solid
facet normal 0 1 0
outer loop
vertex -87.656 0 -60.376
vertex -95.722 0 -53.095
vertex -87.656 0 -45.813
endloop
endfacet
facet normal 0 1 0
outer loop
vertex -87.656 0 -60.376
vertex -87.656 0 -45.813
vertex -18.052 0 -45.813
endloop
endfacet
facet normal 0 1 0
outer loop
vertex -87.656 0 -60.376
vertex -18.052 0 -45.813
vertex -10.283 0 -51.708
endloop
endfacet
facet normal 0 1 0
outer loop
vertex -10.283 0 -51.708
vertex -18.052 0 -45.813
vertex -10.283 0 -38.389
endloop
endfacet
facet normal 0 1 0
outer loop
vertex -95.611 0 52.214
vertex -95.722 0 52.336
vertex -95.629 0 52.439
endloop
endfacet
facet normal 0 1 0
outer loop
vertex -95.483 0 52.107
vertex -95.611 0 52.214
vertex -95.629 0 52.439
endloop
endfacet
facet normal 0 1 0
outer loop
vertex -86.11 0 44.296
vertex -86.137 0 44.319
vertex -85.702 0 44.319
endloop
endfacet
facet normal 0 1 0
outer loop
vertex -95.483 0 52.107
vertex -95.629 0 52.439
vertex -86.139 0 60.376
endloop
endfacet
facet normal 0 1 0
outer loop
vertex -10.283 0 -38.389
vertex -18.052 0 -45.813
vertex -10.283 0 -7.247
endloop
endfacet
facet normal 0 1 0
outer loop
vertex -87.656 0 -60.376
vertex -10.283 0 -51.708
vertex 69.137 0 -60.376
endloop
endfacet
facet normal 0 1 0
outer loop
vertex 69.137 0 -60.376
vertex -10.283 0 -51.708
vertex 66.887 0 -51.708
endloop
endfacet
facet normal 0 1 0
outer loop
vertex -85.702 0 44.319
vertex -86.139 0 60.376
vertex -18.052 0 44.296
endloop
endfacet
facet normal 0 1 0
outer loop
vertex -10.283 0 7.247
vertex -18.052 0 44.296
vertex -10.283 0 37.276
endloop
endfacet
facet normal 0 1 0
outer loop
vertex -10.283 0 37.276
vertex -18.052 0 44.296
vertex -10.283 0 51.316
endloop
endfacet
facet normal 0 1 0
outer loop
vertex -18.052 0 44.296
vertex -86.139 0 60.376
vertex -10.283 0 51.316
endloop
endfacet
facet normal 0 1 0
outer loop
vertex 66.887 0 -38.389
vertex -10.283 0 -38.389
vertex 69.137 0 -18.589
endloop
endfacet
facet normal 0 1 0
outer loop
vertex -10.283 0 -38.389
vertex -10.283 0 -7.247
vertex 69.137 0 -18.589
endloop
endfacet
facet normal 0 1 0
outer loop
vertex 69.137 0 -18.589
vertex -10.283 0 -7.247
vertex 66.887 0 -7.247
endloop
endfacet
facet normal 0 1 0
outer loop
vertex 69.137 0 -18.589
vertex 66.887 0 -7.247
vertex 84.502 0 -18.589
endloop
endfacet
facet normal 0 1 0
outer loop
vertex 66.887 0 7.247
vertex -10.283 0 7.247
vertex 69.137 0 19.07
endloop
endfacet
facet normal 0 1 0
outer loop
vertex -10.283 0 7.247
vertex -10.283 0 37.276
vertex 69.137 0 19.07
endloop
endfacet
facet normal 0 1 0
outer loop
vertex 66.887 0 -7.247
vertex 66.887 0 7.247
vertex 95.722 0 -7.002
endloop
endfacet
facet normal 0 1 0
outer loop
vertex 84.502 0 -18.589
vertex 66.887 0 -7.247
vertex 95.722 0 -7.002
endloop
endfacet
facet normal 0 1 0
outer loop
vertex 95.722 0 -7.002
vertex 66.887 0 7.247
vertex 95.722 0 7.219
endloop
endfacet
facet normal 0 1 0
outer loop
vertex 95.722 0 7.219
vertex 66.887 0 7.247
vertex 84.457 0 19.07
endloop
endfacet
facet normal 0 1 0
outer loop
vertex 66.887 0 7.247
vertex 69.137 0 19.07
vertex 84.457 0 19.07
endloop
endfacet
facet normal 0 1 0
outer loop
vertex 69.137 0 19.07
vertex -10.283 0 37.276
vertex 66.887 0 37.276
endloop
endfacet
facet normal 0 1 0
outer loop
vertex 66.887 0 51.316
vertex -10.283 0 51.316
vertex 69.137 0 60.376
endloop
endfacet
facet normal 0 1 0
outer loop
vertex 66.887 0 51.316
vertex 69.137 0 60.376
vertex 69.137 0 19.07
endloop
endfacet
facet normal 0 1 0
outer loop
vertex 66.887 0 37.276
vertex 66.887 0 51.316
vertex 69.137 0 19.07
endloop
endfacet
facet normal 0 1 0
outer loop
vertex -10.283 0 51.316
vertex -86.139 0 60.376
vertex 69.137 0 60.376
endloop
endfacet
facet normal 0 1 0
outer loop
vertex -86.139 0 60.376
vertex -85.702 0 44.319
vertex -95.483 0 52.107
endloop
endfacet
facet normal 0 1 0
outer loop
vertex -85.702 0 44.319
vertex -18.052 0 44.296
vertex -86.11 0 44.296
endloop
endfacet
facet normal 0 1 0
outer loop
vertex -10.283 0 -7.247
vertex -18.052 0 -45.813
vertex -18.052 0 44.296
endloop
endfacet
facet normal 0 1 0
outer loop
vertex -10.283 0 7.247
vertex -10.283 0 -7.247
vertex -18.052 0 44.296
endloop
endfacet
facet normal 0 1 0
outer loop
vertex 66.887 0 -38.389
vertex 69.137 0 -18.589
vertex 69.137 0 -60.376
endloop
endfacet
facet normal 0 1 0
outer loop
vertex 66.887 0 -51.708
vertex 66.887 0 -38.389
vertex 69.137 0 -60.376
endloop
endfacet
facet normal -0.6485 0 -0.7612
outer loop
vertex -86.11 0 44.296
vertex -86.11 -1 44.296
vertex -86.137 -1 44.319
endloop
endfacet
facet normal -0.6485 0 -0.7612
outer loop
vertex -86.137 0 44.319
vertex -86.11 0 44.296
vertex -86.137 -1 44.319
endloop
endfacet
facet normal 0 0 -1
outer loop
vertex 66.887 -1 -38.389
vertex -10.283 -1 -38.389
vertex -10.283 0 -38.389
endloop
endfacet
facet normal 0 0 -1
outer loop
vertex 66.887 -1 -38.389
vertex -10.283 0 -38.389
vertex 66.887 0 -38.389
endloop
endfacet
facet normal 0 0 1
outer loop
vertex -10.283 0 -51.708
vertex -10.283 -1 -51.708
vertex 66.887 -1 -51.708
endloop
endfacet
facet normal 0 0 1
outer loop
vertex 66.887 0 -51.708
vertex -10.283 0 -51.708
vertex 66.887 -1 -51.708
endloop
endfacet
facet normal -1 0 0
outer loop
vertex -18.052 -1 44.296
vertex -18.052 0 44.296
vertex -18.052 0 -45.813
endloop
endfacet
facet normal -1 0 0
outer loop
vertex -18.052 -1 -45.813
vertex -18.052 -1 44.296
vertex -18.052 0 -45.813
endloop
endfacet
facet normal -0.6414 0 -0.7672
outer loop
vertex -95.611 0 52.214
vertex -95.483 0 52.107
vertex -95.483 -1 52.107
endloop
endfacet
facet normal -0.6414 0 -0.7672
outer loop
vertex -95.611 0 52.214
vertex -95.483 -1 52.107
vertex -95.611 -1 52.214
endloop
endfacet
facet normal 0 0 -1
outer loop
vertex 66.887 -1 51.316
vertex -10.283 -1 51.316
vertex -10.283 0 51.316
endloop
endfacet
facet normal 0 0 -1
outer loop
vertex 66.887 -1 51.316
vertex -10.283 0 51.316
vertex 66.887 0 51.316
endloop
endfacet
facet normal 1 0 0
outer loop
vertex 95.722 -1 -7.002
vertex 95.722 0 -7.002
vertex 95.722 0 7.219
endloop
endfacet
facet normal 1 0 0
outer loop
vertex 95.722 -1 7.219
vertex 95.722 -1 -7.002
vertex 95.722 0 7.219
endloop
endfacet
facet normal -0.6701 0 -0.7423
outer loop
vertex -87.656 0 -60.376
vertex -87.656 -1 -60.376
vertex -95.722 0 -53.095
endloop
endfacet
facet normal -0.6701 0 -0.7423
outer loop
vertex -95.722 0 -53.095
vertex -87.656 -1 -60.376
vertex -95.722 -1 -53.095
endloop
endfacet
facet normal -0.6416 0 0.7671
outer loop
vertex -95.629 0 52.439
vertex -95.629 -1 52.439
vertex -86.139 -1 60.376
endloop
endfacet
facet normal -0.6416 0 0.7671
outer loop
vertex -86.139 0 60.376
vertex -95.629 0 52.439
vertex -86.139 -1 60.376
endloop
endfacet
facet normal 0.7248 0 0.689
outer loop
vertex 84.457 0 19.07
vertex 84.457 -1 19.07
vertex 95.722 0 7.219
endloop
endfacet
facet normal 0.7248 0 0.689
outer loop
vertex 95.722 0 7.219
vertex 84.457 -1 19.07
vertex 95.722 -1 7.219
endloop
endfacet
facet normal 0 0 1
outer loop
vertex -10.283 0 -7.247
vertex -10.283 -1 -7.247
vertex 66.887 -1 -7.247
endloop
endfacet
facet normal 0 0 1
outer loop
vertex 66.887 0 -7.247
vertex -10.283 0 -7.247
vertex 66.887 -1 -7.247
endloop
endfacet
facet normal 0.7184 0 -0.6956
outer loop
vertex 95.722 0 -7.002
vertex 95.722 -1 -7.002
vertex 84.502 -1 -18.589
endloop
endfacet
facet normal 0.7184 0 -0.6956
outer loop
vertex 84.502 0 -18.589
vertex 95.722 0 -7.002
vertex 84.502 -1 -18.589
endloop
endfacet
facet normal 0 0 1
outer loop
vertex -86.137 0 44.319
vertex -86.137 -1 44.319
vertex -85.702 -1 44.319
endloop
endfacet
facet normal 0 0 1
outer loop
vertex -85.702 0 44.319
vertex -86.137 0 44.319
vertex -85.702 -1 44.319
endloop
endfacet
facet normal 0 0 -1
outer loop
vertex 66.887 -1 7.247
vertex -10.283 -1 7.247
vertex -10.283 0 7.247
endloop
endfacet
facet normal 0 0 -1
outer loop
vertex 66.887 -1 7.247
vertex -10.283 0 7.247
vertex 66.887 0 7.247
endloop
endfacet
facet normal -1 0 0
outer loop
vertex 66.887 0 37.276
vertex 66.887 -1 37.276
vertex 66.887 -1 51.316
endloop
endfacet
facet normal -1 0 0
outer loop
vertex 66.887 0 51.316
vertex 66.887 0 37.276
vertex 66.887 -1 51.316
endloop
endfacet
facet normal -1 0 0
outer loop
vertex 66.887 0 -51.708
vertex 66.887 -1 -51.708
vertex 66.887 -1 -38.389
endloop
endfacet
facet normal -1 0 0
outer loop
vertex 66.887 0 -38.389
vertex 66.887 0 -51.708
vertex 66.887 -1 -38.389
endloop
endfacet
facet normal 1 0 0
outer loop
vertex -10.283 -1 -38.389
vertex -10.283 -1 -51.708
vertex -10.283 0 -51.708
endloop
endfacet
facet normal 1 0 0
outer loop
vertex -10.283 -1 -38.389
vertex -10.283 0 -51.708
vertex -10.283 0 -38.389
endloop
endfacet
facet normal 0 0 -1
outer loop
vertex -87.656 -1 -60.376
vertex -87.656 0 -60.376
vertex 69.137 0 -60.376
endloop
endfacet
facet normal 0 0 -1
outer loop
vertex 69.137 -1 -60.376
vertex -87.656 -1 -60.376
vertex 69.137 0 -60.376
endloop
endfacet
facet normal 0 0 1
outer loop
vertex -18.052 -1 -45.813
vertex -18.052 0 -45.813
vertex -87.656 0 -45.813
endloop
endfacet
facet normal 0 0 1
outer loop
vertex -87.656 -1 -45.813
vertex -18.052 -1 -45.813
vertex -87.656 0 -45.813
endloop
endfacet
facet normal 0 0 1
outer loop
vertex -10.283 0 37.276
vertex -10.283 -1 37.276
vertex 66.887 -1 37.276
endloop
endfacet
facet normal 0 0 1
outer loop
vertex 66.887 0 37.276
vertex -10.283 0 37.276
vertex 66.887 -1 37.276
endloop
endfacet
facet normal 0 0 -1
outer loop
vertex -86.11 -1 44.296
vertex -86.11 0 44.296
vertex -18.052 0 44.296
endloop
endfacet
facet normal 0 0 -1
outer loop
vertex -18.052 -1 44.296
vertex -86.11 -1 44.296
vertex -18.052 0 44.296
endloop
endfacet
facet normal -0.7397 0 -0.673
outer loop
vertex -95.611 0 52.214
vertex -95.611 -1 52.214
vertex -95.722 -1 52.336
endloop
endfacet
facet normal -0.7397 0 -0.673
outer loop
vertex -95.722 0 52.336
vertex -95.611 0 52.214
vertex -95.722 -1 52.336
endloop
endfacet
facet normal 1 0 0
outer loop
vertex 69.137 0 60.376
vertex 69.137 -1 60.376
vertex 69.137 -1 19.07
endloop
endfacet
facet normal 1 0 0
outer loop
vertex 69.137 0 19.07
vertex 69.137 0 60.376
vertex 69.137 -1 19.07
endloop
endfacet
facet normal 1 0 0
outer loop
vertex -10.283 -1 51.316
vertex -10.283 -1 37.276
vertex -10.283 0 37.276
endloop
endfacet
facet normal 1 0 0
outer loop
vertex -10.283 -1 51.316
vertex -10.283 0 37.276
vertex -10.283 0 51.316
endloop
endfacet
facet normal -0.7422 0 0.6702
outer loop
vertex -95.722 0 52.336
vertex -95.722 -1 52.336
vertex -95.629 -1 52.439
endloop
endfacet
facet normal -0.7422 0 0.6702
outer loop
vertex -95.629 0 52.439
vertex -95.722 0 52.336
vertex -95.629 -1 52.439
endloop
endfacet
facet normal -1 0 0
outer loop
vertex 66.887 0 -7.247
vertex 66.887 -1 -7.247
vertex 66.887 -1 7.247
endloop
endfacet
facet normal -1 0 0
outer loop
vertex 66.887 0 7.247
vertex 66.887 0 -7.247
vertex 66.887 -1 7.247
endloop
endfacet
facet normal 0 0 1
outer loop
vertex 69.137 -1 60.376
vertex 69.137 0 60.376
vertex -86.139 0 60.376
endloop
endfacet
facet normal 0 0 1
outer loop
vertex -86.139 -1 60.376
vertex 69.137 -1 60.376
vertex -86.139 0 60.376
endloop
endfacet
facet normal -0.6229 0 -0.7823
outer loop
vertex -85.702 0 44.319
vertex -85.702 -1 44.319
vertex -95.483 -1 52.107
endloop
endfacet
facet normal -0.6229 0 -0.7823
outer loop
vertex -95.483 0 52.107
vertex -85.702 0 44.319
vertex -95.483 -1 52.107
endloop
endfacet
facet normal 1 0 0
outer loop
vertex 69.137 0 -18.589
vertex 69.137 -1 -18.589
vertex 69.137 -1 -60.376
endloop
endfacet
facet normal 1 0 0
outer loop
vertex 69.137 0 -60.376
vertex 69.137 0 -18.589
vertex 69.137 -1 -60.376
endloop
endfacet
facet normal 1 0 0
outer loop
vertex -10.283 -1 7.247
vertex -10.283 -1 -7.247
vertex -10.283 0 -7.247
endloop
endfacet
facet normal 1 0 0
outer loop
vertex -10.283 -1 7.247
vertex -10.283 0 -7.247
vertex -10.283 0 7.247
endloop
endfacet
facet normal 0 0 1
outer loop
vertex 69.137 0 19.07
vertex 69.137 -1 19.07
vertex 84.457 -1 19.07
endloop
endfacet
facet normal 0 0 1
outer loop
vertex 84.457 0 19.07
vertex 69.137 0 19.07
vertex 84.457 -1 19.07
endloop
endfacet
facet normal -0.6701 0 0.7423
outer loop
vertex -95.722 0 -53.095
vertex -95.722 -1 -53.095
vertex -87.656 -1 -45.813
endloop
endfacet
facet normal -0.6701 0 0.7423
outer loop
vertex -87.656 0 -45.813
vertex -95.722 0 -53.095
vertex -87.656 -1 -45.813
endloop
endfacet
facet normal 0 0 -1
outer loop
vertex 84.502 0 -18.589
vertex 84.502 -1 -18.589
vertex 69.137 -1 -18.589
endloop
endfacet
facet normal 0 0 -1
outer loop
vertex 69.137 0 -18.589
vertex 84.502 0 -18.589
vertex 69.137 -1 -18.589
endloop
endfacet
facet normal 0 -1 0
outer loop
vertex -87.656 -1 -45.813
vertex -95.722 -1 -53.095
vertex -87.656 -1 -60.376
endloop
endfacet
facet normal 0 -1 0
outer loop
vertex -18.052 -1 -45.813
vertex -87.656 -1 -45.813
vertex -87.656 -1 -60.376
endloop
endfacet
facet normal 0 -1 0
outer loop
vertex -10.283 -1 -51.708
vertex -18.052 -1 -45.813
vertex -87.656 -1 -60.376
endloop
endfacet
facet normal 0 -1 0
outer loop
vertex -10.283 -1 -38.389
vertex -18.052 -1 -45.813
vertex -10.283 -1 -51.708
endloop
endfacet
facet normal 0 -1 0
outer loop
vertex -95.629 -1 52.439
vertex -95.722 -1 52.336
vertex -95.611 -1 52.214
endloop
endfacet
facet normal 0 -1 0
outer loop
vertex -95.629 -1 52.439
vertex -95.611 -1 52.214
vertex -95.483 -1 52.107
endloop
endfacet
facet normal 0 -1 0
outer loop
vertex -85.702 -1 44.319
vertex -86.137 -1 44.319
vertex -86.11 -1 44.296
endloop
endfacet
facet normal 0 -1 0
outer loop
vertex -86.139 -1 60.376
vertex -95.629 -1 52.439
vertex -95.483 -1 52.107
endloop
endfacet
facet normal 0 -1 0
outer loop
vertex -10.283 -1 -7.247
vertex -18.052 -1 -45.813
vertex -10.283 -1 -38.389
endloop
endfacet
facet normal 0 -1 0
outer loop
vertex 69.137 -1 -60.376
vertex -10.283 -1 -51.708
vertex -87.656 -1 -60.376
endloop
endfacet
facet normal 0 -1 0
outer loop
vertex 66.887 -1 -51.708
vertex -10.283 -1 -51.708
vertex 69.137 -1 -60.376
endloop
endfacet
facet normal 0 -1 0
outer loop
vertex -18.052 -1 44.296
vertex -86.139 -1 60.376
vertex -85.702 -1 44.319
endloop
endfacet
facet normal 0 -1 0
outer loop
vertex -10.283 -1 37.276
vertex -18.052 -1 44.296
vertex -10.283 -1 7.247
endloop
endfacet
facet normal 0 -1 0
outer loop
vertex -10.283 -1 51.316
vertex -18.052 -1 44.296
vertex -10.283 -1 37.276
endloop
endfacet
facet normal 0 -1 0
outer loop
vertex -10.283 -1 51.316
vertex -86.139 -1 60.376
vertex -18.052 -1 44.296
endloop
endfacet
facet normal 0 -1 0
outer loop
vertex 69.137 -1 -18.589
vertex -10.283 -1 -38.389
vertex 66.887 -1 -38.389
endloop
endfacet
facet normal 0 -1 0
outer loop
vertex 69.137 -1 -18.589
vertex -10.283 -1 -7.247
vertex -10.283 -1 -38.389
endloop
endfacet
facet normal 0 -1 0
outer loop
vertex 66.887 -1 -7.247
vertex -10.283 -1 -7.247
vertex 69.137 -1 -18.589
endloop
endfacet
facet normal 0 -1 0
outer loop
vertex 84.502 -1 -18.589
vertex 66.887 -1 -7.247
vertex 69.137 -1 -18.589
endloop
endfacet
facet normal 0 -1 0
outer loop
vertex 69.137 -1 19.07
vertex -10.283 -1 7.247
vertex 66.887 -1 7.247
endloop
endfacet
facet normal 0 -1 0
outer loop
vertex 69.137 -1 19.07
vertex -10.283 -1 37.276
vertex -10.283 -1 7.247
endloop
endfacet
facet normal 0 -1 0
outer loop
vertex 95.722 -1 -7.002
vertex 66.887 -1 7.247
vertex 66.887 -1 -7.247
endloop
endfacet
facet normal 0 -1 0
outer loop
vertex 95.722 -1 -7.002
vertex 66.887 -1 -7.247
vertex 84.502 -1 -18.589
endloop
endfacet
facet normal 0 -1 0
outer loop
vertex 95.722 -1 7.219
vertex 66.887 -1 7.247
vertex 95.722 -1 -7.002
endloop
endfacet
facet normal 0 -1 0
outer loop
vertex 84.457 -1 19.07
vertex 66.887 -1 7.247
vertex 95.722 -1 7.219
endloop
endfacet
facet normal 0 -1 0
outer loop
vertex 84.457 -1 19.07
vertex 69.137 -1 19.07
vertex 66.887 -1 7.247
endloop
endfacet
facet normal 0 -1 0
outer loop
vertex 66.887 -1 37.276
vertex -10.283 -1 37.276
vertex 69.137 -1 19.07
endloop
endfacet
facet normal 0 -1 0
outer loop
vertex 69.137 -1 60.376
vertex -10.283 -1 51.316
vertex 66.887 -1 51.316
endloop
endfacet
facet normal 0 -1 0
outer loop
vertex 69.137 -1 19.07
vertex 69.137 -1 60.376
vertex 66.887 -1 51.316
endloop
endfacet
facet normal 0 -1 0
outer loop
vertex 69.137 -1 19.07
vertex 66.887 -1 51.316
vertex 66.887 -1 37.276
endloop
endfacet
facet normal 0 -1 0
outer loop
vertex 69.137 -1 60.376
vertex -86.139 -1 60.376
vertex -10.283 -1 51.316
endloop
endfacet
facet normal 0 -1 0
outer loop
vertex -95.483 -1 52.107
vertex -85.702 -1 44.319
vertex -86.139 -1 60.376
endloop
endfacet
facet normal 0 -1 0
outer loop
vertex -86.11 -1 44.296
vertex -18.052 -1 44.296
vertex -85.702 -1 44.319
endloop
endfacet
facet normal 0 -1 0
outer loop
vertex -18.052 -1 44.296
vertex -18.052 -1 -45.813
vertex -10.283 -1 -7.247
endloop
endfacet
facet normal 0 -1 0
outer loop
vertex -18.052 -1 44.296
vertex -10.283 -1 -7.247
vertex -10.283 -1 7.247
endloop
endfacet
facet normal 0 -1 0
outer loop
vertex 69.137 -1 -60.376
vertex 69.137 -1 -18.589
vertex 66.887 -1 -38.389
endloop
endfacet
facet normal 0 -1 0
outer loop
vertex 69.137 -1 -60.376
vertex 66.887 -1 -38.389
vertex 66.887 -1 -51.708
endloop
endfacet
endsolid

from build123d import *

# Parameters (mm, degrees)
F1_DEPTH  = 1
F2_W      = 77.1699883044
F2_H      = 14.0396282077
F2_H_2    = 14.4938565791
F2_H_3    = 13.3186802268
F3_DEPTH  = 25.4
F5_DEPTH  = 25.4
F7_DEPTH  = 25.4
F9_DEPTH  = 25.4
F12_DEPTH = 25.4
F14_DEPTH = 25.4


with BuildPart() as f1:
    # F0 (on Front) → F1 (new body)
    with BuildSketch(Plane.XZ):
        Polygon((95.7224294543, -60.3764280677), (95.7224294543, 60.3764280677), (-95.7224294543, 60.3764280677), (-95.7224294543, 44.296272099), (-18.052238971, 44.296272099), (-18.052238971, -45.8132624626), (-95.7224294543, -45.8132624626), (-95.7224294543, -60.3764280677), align=None)
    extrude(amount=F1_DEPTH)

    # F2 (on face) → F3 (cut)
    with BuildSketch(Plane.XZ.offset(1)):
        with Locations((28.3021917567, 44.296272099)):
            Rectangle(F2_W, F2_H)
        with Locations((28.3021917567, 0)):
            Rectangle(F2_W, F2_H_2)
        with Locations((28.3021917567, -45.0484715402)):
            Rectangle(F2_W, F2_H_3)
    extrude(amount=-F3_DEPTH, mode=Mode.SUBTRACT)

    # F4 (on face) → F5 (cut)
    with BuildSketch(Plane.XZ.offset(1)):
        Polygon((84.501597172, -18.5892991722), (69.1369175911, -18.5892991722), (69.1369175911, -60.3764280677), (95.7224294543, -60.3764280677), (95.7224294543, -7.0018698461), align=None)
        Polygon((69.1369175911, 60.3764280677), (69.1369175911, 19.0698392689), (84.4565480947, 19.0698392689), (95.7224294543, 7.2190617211), (95.7224294543, 60.3764280677), align=None)
    extrude(amount=-F5_DEPTH, mode=Mode.SUBTRACT)

    # F6 (on face) → F7 (cut)
    with BuildSketch(Plane.XZ.offset(1)):
        Polygon((-95.7224294543, 60.3764280677), (-95.7224294543, 52.3363500834), (-88.4090960026, 60.3764280677), align=None)
        Polygon((-88.4090960026, 44.296272099), (-95.7224294543, 52.3363500834), (-95.7224294543, 44.296272099), align=None)
    extrude(amount=-F7_DEPTH, mode=Mode.SUBTRACT)

    # F8 (on face) → F9 (cut)
    with BuildSketch(Plane.XZ.offset(1)):
        Polygon((-95.7224294543, -45.8132624626), (-95.7224294543, -53.0948452652), (-87.6560211182, -45.8132624626), align=None)
        Polygon((-87.6560211182, -60.3764280677), (-95.7224294543, -53.0948452652), (-95.7224294543, -60.3764280677), align=None)
    extrude(amount=-F9_DEPTH, mode=Mode.SUBTRACT)

    # F11 (on face) → F12 (cut)
    with BuildSketch(Plane.XZ.offset(1)):
        Polygon((-85.7021808624, 44.3187952042), (-95.5954936845, 52.1968003835), (-88.429583239, 44.3187952042), align=None)
        Polygon((-88.4090960026, 60.3764280677), (-94.2494603717, 53.9556918474), (-87.5151380897, 59.4371178139), (-88.2796930664, 60.3764280677), align=None)
    extrude(amount=-F12_DEPTH, mode=Mode.SUBTRACT)

    # F13 (on face) → F14 (cut)
    with BuildSketch(Plane.XZ.offset(1)):
        Polygon((-93.3957355305, 54.8942534959), (-95.6290065626, 52.4390566453), (-86.1386760037, 60.3764280677), (-88.4090960026, 60.3764280677), align=None)
        Polygon((-86.1098706364, 44.296272099), (-95.6111442944, 52.2140062342), (-88.4090960026, 44.296272099), align=None)
    extrude(amount=-F14_DEPTH, mode=Mode.SUBTRACT)


solid = f1.part
